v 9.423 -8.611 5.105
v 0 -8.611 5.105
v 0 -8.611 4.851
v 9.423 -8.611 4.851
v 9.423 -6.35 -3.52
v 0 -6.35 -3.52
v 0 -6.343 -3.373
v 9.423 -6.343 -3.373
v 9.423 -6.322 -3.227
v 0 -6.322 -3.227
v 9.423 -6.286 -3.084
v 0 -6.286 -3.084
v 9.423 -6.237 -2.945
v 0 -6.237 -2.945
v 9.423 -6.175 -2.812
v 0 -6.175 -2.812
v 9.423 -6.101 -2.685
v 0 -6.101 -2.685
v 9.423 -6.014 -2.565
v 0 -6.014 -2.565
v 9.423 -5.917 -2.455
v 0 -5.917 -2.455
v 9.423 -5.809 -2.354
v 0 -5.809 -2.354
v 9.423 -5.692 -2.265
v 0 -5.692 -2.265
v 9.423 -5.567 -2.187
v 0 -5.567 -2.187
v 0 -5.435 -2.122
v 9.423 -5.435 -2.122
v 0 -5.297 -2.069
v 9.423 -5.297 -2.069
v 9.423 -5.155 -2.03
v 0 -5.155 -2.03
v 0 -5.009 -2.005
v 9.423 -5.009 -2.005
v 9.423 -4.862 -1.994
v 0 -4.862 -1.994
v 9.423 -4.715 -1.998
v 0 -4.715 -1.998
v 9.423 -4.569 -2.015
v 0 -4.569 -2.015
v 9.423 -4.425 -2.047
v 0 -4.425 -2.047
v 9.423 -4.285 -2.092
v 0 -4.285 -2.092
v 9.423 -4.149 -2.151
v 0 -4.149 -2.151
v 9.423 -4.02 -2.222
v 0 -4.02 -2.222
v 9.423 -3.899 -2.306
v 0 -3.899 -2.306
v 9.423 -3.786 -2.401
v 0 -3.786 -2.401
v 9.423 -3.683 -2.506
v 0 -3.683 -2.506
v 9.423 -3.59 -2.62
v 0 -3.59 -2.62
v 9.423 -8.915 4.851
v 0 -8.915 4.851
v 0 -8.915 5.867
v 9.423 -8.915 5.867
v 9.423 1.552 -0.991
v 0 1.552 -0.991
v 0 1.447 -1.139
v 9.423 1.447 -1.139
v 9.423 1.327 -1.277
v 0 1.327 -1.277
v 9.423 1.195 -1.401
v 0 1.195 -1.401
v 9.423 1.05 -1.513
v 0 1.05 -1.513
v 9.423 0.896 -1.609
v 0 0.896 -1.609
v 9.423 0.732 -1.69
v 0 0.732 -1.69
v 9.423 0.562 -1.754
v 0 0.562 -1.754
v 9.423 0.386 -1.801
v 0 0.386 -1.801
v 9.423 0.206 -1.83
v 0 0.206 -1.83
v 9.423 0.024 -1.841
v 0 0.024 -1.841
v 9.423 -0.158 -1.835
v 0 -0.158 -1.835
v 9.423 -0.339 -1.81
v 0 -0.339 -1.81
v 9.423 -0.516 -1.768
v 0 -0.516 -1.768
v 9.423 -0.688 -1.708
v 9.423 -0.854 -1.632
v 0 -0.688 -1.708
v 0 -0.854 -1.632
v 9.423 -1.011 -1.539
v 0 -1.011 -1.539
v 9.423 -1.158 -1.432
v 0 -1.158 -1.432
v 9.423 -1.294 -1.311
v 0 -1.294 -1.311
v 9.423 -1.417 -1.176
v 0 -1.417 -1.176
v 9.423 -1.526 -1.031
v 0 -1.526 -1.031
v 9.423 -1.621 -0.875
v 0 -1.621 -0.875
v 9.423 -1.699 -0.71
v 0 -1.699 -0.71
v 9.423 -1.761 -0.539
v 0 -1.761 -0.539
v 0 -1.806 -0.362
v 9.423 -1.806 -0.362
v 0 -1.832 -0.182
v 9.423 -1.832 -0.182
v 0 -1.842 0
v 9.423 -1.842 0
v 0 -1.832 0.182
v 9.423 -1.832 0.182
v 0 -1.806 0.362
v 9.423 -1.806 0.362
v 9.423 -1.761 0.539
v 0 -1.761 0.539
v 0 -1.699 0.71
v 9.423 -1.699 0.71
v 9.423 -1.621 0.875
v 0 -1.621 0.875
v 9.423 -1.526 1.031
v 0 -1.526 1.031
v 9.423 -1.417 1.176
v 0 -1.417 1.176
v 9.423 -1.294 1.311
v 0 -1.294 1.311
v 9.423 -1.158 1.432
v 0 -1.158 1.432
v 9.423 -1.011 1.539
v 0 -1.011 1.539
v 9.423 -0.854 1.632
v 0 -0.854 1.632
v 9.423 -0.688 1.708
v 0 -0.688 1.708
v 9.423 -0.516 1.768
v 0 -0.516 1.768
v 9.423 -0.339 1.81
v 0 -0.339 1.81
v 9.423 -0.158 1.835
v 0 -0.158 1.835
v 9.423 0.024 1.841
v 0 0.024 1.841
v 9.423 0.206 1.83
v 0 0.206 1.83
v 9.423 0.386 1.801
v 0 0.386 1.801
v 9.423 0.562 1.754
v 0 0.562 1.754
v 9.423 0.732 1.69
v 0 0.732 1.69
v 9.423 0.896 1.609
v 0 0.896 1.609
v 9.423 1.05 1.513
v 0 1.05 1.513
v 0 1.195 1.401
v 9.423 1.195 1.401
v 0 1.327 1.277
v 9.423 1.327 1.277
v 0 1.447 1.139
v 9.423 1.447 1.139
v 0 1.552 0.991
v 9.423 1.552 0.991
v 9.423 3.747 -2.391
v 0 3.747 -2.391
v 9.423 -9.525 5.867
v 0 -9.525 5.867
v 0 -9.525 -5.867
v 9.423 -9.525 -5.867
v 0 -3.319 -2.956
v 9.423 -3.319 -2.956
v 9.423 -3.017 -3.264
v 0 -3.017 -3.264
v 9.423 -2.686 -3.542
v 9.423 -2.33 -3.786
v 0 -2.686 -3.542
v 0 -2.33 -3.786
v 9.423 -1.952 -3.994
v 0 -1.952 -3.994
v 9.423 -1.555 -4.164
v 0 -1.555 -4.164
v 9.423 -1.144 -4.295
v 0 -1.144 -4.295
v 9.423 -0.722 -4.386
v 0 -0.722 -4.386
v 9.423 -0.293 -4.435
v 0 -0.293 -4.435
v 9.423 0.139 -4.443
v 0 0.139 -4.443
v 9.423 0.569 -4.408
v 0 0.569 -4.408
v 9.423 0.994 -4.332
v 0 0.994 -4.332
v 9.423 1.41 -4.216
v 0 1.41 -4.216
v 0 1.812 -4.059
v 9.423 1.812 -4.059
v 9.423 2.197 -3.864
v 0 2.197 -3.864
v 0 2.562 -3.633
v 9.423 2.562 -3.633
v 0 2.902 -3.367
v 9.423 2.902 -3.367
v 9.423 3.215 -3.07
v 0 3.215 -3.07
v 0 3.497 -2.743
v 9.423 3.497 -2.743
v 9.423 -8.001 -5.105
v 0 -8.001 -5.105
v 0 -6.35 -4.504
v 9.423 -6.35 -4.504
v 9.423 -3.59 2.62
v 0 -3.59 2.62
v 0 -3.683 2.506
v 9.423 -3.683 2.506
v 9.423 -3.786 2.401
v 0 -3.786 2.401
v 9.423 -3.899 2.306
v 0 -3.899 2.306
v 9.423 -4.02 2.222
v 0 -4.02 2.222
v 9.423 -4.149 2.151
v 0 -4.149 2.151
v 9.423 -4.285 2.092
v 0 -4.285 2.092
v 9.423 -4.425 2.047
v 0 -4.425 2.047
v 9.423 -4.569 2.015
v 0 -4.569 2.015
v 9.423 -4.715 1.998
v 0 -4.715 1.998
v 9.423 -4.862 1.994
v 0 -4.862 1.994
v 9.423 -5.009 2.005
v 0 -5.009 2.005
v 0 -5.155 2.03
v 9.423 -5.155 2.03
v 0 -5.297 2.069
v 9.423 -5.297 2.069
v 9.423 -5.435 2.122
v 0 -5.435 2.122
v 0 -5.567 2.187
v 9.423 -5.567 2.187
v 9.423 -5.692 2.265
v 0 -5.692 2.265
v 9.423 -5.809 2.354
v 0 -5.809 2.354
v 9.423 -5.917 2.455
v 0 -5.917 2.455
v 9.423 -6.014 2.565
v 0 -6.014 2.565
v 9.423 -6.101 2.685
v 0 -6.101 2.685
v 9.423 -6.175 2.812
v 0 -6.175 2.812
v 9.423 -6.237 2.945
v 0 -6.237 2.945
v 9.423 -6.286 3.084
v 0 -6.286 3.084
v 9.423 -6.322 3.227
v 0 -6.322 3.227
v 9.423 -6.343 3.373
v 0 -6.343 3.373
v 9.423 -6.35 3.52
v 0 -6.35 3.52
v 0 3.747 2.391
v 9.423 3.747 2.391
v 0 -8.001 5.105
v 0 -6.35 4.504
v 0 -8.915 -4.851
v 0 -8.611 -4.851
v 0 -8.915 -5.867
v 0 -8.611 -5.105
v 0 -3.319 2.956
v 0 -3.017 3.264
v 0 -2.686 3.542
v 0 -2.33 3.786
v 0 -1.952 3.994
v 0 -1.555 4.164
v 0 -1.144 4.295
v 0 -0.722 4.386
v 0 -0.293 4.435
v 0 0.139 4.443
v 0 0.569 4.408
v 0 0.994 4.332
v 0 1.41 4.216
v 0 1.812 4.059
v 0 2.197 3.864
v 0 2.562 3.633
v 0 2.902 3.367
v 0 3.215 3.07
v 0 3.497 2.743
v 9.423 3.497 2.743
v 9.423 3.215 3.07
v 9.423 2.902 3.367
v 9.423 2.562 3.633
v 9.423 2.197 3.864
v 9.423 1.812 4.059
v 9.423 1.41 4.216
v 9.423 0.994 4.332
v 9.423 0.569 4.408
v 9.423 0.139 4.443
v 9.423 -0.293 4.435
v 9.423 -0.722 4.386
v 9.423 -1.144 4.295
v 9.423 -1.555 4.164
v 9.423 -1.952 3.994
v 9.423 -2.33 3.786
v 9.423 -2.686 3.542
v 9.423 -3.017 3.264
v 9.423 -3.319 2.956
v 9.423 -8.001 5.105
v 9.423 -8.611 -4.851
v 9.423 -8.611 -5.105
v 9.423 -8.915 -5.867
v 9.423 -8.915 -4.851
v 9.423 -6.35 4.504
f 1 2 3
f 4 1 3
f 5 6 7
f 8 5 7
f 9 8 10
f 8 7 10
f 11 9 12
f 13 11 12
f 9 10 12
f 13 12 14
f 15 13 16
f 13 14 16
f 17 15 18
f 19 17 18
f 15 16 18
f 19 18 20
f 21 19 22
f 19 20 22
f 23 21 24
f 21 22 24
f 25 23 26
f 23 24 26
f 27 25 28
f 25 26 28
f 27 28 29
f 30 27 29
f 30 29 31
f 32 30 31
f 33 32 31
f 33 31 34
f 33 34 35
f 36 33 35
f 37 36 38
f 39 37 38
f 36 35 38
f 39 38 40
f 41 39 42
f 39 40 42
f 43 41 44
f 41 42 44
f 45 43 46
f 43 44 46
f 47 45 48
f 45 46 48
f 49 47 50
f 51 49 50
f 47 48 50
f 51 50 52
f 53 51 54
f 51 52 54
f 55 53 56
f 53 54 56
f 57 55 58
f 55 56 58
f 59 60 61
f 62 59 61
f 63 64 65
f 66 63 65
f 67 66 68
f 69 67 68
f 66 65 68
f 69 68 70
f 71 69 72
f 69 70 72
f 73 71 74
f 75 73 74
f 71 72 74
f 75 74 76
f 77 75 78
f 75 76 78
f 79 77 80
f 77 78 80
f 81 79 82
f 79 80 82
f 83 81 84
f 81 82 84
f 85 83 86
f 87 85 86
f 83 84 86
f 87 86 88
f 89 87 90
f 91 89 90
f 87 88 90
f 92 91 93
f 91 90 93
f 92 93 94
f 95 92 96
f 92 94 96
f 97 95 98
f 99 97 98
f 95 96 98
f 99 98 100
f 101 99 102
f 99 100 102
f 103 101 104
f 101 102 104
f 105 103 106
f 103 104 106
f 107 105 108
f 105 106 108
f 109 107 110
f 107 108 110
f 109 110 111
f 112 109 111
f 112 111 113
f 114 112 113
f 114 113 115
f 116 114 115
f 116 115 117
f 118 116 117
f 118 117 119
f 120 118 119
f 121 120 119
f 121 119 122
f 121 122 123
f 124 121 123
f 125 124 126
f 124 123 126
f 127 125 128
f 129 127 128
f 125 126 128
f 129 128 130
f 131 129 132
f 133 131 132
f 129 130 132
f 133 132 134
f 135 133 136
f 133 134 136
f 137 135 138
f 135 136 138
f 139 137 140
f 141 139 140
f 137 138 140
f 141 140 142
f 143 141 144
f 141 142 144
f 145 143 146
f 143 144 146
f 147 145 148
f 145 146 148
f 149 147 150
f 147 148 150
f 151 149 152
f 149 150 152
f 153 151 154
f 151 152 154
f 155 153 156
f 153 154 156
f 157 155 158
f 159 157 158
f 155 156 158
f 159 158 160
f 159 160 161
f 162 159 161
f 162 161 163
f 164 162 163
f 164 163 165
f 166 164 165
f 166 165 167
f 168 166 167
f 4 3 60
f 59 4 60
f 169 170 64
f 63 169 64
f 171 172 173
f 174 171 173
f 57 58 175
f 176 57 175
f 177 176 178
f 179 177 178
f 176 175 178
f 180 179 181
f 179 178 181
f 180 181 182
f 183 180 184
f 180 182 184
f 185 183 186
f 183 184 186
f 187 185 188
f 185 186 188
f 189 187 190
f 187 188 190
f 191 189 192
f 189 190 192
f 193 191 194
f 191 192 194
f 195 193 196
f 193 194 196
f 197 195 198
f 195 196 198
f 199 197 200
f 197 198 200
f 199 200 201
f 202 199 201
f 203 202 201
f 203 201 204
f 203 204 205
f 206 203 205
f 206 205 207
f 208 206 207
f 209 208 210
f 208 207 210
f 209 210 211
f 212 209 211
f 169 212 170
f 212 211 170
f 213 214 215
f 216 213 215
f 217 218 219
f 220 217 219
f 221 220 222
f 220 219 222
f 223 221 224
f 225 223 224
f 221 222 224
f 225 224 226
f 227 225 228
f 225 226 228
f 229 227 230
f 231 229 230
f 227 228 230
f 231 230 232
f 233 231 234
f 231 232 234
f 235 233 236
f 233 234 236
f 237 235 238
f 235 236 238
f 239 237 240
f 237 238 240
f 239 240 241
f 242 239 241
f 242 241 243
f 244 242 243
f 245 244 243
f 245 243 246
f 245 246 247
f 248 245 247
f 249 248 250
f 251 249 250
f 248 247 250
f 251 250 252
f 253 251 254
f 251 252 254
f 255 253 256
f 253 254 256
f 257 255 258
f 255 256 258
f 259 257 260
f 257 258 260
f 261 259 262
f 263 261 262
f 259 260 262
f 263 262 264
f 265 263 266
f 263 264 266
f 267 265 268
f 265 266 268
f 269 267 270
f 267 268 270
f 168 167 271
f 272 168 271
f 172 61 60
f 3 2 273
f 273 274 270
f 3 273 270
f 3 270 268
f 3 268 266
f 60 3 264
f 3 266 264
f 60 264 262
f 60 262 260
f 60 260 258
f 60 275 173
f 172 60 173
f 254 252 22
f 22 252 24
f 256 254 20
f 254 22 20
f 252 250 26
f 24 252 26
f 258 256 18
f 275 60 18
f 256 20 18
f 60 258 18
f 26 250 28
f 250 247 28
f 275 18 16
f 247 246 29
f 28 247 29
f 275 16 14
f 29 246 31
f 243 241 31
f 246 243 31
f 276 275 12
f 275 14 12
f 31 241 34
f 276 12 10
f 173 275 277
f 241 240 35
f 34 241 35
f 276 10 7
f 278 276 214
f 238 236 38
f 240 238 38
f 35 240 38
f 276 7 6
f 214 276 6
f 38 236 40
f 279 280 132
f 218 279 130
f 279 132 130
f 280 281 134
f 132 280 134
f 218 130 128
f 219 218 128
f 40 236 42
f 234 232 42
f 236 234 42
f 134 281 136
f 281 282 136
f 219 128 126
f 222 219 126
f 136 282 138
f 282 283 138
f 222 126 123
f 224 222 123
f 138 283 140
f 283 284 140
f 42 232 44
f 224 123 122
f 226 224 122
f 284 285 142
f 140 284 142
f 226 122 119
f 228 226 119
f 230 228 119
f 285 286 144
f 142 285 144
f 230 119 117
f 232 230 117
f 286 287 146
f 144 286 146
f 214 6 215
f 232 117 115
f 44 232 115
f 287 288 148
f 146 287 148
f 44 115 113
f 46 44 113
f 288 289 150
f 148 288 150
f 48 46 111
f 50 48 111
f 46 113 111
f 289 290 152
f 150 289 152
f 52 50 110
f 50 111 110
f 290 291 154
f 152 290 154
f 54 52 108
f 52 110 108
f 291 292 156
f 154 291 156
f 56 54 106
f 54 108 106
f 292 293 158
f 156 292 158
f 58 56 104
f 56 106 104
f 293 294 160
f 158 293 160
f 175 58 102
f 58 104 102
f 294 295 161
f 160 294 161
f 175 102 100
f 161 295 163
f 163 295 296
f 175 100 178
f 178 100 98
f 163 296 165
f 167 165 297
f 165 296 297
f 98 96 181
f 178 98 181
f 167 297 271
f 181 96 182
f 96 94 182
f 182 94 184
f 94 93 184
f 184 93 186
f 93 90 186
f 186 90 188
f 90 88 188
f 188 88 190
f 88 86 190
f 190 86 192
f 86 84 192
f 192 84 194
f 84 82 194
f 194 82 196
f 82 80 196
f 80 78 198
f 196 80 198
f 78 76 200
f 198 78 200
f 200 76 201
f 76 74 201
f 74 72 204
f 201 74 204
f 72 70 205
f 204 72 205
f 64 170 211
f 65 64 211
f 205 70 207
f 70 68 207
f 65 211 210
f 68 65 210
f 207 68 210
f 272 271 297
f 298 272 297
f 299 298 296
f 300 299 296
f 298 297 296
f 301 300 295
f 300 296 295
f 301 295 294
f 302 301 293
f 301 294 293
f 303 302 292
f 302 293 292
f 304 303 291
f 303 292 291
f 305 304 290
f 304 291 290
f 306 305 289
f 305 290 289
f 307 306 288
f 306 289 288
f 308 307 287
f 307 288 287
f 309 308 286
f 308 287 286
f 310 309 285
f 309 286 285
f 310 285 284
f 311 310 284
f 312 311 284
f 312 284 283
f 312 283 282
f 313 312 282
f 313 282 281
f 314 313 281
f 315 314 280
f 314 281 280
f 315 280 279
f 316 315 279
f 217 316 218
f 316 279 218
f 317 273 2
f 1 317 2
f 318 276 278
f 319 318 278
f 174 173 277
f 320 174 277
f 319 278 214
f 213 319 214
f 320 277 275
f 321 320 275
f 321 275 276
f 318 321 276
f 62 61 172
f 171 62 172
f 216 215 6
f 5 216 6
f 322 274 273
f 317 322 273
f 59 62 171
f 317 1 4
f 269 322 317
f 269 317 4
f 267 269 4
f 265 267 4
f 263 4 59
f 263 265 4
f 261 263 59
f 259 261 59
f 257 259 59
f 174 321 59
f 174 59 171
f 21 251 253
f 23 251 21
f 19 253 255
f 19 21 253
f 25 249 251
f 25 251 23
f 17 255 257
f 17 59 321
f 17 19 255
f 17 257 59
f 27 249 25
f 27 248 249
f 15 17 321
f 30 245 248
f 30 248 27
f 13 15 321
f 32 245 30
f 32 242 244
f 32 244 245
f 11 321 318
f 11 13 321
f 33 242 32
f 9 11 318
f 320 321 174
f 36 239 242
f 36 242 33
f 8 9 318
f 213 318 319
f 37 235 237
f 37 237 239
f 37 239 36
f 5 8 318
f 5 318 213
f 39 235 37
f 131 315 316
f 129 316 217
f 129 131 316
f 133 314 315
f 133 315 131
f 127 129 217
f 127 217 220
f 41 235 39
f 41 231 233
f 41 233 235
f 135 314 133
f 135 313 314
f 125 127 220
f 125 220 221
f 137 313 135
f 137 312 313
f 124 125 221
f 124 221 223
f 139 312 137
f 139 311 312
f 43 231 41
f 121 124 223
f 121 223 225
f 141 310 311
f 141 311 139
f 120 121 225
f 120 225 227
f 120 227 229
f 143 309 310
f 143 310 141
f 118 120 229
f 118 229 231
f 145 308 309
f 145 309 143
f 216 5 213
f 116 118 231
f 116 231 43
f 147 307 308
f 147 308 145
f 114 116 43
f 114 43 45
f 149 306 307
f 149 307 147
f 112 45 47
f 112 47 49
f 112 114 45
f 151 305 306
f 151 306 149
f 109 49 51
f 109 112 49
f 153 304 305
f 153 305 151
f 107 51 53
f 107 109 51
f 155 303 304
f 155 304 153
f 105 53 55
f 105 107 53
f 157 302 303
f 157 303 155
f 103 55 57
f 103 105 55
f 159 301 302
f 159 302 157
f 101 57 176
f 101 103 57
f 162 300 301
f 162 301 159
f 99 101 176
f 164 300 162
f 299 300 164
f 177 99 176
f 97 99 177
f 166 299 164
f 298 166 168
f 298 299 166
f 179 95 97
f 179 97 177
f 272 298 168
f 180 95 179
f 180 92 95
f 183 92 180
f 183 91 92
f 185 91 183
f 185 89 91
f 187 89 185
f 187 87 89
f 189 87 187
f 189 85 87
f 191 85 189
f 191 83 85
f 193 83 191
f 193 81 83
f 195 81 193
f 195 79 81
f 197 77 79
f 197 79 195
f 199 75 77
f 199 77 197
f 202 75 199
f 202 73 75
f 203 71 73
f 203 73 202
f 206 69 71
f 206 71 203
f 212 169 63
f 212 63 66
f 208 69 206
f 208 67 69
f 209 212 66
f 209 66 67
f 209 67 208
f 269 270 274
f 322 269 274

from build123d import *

# Parameters (mm, degrees)
BODY_DEPTH = 9.4234


with BuildPart() as part:
    # BodySke → Body (new body)
    with BuildSketch(Plane(origin=(0, 0, 0), x_dir=(0, 0, -1), z_dir=(1, 0, 0))):
        with BuildLine():
            Line((-5.8674, -9.525), (5.8674, -9.525))
            Line((5.8674, -9.525), (5.8674, -8.9154))
            Line((5.8674, -8.9154), (4.8514, -8.9154))
            Line((4.8514, -8.9154), (4.8514, -8.6106))
            Line((4.8514, -8.6106), (5.1054, -8.6106))
            Line((5.1054, -8.6106), (5.1054, -8.001))
            Line((5.1054, -8.001), (4.504485143, -6.35))
            Line((4.504485143, -6.35), (3.520438226, -6.35))
            ThreePointArc((3.520438226, -6.35), (2.069125842, -5.296760115), (2.620488612, -3.59041285))
            ThreePointArc((2.620488612, -3.59041285), (4.442829508, 0.138891913), (2.391103448, 3.747085441))
            Line((2.391103448, 3.747085441), (0.9906, 1.552363968))
            ThreePointArc((0.9906, 1.552363968), (0, -1.8415), (-0.9906, 1.552363968))
            Line((-0.9906, 1.552363968), (-2.391103448, 3.747085441))
            ThreePointArc((-2.391103448, 3.747085441), (-4.442829508, 0.138891913), (-2.620488612, -3.59041285))
            ThreePointArc((-2.620488612, -3.59041285), (-2.069125842, -5.296760115), (-3.520438226, -6.35))
            Line((-3.520438226, -6.35), (-4.504485143, -6.35))
            Line((-4.504485143, -6.35), (-5.1054, -8.001))
            Line((-5.1054, -8.001), (-5.1054, -8.6106))
            Line((-5.1054, -8.6106), (-4.8514, -8.6106))
            Line((-4.8514, -8.6106), (-4.8514, -8.9154))
            Line((-4.8514, -8.9154), (-5.8674, -8.9154))
            Line((-5.8674, -8.9154), (-5.8674, -9.525))
        make_face()
    extrude(amount=BODY_DEPTH)


solid = part.part
